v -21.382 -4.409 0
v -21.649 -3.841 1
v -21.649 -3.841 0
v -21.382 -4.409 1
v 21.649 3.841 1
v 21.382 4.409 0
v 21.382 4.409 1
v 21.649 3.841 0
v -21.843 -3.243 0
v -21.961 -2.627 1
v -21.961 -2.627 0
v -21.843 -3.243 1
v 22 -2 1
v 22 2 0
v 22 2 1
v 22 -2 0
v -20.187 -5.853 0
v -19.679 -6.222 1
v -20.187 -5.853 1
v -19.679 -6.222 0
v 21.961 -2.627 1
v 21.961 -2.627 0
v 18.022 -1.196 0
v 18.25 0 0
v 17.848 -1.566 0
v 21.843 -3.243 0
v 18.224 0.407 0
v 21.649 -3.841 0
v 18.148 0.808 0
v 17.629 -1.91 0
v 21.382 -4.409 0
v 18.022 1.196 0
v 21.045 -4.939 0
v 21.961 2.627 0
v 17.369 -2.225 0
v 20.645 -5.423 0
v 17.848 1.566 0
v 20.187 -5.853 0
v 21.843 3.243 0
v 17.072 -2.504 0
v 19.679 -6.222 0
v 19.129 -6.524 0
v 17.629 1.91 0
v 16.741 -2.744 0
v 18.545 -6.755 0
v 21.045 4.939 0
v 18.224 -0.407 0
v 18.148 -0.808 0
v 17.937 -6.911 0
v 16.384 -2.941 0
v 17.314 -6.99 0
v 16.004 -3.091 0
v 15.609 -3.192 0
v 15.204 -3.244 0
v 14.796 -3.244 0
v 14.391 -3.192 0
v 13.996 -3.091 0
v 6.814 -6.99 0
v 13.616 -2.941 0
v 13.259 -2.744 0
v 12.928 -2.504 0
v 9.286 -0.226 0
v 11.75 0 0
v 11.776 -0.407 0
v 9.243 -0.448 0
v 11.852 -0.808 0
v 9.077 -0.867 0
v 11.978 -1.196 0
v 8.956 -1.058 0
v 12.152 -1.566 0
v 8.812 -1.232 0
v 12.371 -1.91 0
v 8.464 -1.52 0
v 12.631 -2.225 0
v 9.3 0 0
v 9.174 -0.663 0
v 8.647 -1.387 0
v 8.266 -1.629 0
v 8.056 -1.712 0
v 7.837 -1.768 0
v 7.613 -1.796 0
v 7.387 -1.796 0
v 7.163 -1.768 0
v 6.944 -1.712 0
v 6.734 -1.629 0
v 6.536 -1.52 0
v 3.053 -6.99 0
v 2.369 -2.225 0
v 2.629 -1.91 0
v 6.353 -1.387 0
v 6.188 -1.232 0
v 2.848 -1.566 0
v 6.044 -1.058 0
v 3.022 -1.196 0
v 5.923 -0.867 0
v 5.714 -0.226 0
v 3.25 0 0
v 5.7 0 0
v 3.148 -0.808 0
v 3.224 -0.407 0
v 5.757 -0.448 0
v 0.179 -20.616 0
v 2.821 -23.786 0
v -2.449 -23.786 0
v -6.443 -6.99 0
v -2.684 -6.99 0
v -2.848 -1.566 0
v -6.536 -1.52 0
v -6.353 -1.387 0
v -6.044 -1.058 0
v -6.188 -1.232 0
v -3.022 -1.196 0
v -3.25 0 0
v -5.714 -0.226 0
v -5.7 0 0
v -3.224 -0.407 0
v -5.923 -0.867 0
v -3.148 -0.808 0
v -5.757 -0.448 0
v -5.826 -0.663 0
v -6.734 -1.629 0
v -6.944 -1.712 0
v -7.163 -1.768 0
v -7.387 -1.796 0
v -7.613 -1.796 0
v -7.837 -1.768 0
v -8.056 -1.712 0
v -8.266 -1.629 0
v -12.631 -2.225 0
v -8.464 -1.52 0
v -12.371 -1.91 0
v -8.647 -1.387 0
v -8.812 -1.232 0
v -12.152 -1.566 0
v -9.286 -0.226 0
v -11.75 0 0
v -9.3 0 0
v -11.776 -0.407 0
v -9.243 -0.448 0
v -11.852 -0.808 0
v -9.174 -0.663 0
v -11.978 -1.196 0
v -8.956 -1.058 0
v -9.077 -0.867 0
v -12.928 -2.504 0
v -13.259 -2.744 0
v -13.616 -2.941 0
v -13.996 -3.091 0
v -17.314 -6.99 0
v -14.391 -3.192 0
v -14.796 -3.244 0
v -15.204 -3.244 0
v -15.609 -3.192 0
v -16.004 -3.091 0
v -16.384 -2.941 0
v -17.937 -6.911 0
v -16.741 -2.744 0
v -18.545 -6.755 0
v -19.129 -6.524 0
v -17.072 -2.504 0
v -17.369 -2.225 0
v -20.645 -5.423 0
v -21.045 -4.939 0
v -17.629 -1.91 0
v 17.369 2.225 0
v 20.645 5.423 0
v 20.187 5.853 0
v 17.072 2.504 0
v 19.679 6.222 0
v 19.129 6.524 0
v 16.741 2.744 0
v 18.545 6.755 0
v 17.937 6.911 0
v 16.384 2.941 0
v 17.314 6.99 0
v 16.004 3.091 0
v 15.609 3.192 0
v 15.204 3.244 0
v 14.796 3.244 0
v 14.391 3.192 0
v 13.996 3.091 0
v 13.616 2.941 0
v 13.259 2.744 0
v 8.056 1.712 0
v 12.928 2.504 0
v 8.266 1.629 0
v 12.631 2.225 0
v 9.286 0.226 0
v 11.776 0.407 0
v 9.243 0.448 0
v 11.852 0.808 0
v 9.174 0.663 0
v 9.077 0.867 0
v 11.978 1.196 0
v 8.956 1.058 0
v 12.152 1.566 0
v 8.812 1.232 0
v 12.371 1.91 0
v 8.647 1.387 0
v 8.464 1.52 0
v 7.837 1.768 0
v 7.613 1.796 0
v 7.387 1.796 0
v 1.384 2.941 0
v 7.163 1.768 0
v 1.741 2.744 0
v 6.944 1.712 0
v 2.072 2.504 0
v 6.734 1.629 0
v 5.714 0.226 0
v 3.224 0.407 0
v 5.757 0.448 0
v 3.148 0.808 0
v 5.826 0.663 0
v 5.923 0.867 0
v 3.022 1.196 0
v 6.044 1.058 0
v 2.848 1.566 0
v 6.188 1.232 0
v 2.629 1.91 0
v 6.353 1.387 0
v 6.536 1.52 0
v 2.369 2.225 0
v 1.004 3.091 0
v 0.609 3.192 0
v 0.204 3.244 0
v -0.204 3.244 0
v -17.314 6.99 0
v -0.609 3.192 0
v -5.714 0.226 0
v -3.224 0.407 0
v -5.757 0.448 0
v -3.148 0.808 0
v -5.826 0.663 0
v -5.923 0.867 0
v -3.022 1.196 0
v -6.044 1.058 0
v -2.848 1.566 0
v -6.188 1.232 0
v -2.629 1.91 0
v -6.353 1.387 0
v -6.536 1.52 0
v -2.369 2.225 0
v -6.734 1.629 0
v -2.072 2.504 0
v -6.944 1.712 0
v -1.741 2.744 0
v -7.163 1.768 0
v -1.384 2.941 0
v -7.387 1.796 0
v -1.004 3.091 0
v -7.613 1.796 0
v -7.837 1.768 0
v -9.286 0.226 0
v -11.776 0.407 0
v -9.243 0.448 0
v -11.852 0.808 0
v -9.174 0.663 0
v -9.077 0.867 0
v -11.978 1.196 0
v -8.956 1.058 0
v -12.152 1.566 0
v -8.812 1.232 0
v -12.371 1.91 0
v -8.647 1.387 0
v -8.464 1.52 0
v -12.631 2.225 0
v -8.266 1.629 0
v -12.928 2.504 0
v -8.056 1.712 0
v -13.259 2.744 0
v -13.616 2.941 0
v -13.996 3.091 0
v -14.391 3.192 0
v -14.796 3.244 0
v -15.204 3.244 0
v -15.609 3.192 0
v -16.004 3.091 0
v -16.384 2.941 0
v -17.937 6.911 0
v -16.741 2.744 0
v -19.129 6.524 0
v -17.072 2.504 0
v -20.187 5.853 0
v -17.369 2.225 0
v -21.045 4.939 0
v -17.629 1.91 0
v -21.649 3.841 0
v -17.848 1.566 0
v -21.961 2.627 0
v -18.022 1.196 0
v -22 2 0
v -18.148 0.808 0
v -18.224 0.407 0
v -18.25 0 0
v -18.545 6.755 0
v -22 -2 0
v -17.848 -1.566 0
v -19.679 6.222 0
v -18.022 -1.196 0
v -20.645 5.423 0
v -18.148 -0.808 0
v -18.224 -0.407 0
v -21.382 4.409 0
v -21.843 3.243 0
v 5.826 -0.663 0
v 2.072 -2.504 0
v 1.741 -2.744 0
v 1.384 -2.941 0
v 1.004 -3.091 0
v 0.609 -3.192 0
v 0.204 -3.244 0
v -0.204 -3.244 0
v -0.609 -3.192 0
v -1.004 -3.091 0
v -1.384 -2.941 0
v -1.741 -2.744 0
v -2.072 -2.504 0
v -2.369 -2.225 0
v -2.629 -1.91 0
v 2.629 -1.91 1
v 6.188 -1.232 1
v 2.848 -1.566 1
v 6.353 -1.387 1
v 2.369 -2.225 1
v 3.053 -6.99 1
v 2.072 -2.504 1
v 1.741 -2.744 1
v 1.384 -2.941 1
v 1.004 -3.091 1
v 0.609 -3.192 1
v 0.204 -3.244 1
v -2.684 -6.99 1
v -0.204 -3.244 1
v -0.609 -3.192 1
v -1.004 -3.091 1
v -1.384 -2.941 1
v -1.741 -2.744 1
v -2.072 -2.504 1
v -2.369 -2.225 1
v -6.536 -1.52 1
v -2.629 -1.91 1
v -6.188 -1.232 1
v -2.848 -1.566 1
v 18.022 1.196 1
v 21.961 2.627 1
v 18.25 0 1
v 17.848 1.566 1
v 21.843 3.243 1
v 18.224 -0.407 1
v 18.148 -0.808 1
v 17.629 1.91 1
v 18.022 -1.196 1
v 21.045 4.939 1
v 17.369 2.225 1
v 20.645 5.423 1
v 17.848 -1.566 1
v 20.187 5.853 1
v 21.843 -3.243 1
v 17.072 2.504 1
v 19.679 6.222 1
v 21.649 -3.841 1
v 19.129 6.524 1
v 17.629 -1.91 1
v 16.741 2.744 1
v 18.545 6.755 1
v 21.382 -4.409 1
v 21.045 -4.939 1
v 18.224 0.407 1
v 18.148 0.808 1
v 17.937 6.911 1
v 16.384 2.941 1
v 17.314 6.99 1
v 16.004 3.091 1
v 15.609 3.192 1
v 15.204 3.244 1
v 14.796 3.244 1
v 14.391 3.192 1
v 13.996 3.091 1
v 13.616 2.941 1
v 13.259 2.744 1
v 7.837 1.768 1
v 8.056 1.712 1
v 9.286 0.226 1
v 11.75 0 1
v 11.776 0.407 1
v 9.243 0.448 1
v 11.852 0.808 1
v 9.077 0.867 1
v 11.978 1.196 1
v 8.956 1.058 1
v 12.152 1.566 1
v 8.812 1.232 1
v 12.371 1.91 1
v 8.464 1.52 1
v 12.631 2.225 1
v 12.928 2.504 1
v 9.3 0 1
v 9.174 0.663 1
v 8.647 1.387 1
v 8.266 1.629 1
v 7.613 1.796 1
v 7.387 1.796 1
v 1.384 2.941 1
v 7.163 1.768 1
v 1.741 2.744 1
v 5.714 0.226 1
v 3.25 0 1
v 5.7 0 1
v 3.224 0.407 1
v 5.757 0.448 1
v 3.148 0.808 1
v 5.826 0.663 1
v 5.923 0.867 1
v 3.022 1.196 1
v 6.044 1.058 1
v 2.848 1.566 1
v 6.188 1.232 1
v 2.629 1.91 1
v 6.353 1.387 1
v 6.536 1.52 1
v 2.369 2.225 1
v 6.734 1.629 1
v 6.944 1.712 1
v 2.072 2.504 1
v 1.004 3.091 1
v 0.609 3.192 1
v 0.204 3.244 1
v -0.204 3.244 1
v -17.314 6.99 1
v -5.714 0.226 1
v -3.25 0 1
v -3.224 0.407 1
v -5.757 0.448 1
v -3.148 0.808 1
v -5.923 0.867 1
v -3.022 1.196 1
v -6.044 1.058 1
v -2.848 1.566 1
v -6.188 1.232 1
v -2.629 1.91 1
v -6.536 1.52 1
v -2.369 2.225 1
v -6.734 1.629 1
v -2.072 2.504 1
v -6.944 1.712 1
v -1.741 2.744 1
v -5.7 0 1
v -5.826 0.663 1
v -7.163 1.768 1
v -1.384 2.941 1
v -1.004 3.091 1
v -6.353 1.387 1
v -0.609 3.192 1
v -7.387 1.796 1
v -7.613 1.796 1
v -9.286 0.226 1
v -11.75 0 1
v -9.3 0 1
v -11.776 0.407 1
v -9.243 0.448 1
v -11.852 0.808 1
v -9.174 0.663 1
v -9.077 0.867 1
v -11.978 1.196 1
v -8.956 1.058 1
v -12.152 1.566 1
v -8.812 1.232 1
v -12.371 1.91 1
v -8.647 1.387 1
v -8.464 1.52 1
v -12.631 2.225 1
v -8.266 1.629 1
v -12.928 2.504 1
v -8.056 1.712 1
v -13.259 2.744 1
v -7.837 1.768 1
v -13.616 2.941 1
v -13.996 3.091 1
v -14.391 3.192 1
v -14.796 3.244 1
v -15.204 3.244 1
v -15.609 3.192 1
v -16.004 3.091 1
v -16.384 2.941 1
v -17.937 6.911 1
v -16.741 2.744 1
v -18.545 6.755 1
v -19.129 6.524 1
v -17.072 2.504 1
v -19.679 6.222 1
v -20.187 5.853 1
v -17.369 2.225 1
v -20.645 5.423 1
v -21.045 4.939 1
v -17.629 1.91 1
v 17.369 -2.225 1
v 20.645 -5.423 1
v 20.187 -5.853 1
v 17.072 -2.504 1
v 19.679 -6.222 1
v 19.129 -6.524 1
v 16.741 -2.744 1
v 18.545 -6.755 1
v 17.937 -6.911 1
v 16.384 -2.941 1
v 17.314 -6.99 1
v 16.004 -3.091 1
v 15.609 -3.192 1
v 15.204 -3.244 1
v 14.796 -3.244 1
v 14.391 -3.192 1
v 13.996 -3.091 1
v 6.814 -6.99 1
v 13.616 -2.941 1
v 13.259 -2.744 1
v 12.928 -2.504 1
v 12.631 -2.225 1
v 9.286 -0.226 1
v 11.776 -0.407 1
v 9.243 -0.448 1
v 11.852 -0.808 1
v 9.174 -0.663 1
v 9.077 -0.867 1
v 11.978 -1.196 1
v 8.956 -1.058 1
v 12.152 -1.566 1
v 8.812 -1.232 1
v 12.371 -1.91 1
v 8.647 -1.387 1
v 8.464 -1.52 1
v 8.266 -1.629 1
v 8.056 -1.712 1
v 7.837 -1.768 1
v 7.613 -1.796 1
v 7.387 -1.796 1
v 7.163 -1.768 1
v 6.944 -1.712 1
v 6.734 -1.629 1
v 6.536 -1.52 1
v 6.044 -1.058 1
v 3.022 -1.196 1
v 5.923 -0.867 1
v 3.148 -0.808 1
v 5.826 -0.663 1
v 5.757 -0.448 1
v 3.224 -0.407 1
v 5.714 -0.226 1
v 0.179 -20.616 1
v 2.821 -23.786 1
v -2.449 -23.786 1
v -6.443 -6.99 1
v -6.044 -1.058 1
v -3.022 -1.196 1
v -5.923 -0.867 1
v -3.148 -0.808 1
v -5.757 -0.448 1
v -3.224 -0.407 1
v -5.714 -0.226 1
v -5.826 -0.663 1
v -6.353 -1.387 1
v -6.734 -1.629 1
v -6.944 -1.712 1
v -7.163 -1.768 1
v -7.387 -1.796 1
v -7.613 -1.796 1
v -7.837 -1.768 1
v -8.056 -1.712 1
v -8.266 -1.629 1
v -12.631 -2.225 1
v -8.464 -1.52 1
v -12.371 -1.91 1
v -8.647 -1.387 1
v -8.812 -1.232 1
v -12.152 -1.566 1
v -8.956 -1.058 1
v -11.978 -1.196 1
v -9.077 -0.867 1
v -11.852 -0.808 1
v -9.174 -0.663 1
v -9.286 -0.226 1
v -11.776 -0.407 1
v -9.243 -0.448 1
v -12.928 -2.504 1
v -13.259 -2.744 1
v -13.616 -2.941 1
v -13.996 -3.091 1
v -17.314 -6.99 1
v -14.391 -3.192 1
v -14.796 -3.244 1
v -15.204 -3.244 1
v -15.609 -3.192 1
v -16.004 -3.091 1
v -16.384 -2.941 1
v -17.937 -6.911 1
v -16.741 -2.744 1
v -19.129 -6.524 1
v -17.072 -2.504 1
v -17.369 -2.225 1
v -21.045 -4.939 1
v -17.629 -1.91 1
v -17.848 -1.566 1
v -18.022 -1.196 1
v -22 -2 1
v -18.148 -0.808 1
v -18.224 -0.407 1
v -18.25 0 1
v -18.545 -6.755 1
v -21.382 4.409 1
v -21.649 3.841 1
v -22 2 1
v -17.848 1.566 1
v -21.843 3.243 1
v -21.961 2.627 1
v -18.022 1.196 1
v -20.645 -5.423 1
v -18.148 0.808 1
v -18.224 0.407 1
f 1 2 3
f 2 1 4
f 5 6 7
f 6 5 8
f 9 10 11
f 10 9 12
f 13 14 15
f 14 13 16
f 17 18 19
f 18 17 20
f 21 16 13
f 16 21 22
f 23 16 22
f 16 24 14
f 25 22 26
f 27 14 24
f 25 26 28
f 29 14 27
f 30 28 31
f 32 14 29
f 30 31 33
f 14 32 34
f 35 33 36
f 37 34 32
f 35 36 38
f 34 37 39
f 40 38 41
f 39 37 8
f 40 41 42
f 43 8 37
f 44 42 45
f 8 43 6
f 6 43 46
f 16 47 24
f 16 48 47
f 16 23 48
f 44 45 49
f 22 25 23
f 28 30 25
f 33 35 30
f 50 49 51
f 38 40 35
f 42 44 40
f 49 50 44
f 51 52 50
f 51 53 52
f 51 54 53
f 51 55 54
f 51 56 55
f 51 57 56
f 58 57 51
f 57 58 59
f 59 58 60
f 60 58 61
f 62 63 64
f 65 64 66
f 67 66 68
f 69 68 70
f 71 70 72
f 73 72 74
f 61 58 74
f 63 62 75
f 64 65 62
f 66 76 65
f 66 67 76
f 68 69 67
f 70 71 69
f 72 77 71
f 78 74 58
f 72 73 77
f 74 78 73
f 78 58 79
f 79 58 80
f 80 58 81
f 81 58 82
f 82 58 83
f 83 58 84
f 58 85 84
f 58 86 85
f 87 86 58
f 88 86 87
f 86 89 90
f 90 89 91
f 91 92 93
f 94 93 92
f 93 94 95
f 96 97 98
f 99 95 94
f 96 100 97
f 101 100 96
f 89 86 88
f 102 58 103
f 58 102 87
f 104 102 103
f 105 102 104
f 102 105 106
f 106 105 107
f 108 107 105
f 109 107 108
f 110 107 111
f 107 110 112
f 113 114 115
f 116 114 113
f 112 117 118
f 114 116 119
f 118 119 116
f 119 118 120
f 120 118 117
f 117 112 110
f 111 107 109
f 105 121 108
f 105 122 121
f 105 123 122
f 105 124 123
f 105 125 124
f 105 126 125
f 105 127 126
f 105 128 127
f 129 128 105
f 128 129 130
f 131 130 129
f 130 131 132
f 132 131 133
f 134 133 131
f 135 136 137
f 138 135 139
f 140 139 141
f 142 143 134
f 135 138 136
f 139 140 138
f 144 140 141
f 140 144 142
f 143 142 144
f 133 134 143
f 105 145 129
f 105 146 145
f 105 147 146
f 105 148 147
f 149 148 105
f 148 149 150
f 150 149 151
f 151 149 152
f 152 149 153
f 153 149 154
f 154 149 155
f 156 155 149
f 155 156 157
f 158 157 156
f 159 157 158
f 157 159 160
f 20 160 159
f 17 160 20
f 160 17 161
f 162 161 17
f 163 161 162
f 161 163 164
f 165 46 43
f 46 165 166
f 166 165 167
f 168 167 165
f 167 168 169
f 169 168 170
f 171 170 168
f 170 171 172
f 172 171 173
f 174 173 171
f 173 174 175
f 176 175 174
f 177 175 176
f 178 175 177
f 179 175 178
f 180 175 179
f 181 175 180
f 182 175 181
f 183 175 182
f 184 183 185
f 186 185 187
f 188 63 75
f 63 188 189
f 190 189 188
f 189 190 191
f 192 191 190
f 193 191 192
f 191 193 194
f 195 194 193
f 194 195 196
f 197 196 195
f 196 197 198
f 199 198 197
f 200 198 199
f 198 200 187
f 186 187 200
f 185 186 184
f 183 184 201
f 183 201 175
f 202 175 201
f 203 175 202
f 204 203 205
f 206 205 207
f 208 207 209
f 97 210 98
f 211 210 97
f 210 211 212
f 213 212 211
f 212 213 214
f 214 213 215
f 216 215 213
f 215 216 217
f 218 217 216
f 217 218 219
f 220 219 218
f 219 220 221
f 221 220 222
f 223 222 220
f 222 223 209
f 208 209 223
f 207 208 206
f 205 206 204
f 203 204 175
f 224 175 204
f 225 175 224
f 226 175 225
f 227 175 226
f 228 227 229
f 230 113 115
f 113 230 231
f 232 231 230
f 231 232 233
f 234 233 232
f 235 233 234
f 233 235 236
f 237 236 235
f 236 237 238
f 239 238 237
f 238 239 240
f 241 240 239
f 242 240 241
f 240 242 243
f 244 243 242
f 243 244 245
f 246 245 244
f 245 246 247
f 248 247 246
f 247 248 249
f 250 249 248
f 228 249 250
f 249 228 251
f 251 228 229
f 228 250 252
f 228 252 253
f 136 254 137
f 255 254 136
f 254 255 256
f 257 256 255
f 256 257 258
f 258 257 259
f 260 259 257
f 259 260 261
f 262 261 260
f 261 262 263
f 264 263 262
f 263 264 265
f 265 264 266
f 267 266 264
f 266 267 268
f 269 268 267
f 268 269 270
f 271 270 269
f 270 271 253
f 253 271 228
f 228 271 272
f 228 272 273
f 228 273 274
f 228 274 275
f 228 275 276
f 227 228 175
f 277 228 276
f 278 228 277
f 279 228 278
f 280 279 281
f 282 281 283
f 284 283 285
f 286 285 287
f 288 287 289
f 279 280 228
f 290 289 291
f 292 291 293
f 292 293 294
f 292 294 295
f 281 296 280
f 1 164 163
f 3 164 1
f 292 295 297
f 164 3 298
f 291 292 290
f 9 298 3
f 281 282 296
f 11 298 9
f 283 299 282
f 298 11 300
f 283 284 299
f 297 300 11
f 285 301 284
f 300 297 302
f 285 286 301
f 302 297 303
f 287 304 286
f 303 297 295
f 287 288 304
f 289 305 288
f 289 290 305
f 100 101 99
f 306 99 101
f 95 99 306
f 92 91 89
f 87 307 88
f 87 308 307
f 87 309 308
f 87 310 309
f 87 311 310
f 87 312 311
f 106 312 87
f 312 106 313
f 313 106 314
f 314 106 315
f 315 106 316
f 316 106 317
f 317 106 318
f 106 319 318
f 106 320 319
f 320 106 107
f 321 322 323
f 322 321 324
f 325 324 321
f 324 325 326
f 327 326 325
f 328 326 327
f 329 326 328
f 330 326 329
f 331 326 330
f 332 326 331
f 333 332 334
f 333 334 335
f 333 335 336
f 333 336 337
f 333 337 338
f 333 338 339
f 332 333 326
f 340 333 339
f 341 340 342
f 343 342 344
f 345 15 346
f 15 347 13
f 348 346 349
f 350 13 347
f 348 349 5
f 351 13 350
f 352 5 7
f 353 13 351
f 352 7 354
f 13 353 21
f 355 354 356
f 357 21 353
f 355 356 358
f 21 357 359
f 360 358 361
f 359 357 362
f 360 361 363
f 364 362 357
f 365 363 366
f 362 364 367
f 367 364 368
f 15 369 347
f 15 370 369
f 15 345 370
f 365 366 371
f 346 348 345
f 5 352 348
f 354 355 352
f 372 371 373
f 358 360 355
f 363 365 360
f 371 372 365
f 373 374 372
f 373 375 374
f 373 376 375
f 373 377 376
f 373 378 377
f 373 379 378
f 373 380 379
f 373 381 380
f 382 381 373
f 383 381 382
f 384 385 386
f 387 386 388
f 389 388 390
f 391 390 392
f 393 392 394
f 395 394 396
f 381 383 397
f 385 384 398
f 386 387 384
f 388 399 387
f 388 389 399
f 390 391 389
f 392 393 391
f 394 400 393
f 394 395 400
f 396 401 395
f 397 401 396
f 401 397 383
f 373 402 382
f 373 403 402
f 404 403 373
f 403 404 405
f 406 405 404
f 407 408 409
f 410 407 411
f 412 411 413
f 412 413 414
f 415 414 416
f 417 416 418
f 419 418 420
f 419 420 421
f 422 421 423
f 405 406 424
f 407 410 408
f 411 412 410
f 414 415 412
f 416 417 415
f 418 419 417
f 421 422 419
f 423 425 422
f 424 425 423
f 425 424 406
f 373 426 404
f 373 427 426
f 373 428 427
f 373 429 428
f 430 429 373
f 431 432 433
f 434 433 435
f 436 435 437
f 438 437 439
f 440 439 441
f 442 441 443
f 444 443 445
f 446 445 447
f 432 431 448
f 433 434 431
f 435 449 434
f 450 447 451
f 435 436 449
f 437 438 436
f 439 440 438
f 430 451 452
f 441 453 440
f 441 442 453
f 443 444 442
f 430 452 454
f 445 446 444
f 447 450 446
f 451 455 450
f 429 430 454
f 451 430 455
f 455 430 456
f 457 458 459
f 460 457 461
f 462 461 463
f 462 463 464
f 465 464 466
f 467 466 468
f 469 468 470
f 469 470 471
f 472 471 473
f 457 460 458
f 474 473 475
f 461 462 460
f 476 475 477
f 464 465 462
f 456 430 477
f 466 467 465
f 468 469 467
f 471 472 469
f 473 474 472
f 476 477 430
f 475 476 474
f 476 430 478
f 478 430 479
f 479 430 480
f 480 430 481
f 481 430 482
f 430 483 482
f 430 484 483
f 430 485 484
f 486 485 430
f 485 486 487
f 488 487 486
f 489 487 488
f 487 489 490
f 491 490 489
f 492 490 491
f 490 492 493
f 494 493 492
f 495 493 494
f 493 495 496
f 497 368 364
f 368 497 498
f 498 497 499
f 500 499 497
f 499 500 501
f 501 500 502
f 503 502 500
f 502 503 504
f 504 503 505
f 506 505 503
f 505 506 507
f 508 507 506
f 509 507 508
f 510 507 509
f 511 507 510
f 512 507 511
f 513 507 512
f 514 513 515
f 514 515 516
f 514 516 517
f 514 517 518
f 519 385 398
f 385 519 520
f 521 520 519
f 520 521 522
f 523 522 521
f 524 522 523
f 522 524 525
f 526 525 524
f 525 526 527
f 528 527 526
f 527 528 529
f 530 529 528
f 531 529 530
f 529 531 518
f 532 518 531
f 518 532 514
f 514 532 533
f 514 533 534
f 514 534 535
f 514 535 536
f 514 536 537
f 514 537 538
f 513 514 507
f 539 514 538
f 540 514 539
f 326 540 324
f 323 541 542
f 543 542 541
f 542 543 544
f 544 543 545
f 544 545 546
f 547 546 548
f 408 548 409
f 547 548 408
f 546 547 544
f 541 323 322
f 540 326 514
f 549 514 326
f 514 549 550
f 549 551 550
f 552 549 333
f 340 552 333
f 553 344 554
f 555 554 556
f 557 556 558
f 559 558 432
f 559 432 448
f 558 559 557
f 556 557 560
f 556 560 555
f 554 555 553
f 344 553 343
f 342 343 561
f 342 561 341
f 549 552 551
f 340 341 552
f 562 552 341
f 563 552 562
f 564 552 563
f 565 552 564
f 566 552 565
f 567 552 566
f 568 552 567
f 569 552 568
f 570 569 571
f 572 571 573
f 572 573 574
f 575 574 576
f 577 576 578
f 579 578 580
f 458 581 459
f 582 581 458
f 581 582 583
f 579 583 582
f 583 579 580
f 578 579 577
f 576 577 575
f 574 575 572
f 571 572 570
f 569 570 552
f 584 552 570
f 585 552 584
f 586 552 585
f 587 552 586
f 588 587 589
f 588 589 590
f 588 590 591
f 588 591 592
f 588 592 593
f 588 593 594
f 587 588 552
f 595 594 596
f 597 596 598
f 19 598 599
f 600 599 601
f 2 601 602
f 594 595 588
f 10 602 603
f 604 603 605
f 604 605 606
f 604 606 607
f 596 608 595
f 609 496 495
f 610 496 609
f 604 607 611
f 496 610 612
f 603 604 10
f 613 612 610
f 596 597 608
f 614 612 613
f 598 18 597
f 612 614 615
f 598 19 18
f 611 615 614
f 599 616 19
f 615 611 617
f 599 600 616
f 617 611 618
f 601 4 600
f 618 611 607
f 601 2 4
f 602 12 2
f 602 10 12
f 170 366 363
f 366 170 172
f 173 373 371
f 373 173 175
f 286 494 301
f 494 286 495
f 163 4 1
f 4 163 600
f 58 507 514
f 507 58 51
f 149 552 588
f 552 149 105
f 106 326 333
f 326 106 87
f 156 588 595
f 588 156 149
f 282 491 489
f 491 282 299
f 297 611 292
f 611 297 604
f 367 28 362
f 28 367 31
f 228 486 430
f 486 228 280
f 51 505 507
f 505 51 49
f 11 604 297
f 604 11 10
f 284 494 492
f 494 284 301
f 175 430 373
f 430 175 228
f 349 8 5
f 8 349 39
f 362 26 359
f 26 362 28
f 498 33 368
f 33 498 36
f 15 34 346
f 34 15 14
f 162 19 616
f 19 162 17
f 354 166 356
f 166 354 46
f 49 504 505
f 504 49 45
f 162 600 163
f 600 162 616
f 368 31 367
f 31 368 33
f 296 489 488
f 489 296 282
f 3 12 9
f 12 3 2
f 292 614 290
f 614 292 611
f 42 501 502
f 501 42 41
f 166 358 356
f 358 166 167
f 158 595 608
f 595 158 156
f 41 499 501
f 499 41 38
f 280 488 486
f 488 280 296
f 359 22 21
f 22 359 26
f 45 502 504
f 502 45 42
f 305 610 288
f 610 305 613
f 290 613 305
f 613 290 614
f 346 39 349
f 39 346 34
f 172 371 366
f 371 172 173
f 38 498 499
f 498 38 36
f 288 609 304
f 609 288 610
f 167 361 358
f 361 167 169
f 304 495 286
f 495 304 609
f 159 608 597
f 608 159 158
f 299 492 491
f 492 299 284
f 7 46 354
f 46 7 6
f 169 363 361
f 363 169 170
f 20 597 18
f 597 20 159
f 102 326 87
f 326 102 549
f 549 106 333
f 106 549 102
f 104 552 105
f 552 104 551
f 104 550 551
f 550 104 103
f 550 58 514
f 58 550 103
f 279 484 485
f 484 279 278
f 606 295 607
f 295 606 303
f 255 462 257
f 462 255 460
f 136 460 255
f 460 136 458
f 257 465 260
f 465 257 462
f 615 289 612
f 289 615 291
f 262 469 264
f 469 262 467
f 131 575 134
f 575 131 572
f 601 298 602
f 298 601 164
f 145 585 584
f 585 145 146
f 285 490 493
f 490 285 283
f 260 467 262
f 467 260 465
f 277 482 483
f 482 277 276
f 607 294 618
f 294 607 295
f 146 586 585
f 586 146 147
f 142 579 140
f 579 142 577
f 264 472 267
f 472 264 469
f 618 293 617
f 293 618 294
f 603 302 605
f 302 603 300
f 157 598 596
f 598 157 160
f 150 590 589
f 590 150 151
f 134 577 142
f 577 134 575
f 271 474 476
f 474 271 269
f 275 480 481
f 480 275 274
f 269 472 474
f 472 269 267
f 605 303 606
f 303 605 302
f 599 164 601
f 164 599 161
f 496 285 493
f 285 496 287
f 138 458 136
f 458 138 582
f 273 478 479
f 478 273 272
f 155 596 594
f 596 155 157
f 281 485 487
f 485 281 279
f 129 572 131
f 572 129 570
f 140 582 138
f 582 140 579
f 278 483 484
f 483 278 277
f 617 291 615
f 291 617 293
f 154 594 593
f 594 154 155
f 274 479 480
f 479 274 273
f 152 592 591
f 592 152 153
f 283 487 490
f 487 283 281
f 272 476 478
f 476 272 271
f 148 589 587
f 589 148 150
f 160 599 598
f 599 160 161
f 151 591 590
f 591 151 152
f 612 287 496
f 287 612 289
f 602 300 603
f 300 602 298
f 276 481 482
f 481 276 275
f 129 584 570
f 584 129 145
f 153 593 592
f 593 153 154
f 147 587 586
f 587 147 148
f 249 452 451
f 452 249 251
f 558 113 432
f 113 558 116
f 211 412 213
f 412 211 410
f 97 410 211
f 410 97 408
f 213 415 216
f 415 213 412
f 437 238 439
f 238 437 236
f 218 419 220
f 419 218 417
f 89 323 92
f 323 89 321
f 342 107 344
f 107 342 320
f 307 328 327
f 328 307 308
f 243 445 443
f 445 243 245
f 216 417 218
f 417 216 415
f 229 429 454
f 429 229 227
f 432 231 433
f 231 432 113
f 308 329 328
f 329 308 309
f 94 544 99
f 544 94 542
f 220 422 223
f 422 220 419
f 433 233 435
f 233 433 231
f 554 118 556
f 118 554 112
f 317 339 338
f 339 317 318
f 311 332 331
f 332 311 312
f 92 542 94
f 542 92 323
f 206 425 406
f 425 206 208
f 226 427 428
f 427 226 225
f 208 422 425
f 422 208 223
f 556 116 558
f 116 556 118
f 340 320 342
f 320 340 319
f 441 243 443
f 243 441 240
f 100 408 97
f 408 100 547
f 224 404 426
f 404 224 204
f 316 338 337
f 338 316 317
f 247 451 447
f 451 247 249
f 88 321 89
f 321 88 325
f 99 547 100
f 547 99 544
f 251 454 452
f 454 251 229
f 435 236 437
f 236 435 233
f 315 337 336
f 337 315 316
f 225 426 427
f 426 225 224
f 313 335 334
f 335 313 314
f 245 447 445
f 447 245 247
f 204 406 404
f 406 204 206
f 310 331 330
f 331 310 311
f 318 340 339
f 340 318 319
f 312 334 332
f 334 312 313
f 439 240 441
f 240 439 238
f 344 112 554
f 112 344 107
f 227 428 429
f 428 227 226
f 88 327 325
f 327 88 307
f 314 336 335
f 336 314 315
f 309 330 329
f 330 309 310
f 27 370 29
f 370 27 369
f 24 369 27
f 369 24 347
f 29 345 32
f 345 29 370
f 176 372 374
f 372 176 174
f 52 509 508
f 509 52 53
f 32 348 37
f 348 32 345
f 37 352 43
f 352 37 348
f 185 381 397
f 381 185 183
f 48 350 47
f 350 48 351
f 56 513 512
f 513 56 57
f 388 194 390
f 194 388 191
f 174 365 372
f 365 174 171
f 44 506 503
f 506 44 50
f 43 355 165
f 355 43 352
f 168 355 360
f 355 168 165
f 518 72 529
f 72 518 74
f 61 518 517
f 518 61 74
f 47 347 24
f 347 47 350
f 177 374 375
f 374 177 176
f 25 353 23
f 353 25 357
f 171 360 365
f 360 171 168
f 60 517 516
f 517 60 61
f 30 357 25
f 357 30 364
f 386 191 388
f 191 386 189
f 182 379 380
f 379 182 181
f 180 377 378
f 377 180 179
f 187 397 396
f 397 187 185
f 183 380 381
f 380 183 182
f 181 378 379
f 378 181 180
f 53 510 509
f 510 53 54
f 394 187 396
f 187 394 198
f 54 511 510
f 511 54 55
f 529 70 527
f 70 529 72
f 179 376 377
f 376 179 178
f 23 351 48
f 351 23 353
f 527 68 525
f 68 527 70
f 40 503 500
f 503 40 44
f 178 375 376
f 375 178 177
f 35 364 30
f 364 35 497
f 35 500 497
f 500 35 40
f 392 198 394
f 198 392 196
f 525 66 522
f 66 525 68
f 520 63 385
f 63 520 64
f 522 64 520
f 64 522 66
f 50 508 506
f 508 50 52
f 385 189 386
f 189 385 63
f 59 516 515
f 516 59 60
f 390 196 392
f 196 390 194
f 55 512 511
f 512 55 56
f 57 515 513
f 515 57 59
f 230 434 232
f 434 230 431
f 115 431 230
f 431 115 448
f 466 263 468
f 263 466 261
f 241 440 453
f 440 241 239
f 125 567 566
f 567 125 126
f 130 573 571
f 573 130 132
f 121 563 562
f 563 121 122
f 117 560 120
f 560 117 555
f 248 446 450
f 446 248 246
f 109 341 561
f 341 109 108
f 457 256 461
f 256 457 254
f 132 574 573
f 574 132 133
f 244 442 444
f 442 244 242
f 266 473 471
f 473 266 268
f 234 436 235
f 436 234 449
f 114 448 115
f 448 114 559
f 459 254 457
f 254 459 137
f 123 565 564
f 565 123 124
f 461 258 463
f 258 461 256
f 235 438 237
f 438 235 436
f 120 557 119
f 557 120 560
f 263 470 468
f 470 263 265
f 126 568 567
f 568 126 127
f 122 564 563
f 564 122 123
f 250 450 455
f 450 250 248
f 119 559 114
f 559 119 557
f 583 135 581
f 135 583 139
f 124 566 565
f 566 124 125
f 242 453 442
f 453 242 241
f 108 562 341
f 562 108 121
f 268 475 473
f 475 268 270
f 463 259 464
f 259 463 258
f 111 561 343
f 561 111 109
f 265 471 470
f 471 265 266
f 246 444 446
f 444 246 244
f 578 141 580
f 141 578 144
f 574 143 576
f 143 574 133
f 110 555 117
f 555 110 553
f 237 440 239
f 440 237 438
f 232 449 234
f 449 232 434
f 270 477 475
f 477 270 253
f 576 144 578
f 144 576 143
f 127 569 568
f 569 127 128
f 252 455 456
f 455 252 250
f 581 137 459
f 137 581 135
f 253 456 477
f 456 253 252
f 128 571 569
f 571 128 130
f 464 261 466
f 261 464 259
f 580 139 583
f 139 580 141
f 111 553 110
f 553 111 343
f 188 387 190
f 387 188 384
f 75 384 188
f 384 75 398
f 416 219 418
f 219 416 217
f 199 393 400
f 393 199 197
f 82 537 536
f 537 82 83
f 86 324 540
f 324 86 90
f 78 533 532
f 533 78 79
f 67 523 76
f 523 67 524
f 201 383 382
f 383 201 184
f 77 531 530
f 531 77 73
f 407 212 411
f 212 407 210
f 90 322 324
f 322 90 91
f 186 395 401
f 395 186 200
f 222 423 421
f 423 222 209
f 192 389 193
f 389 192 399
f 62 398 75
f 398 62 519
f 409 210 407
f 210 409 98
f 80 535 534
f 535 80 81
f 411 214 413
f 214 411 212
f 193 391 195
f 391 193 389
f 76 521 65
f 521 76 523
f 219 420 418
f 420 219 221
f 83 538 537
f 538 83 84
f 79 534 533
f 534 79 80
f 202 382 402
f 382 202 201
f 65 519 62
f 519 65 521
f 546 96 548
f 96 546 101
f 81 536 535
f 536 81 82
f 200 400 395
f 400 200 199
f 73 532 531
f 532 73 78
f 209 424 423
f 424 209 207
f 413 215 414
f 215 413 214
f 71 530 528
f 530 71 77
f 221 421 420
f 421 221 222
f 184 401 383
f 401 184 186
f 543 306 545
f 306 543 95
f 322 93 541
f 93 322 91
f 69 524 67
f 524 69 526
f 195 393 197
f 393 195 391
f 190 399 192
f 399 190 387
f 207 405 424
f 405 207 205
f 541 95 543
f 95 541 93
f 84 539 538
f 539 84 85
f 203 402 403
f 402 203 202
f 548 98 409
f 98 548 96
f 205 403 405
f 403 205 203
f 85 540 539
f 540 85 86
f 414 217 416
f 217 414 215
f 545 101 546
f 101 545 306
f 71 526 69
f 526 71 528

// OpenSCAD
$fn = 50;


difference() {
	union() {
		hull() {
			translate(v = [-17.0000000000, 2.0000000000, 0]) {
				cylinder(h = 1, r = 5);
			}
			translate(v = [17.0000000000, 2.0000000000, 0]) {
				cylinder(h = 1, r = 5);
			}
			translate(v = [-17.0000000000, -2.0000000000, 0]) {
				cylinder(h = 1, r = 5);
			}
			translate(v = [17.0000000000, -2.0000000000, 0]) {
				cylinder(h = 1, r = 5);
			}
		}
		translate(v = [0, -5, 0]) {
			linear_extrude(height = 1) {
				text(font = "DejaVu Sans Mono:style=Bold", halign = "center", size = 19.0000000000, text = "V", valign = "top");
			}
		}
	}
	union() {
		translate(v = [-15.0000000000, 0.0000000000, 0]) {
			translate(v = [0, 0, -100]) {
				cylinder(h = 200, r = 3.2500000000);
			}
		}
		translate(v = [0, 0, -100]) {
			cylinder(h = 200, r = 3.2500000000);
		}
		translate(v = [15.0000000000, 0.0000000000, 0]) {
			translate(v = [0, 0, -100]) {
				cylinder(h = 200, r = 3.2500000000);
			}
		}
		translate(v = [-15.0000000000, 0.0000000000, 0]) {
			translate(v = [0, 0, -100]) {
				cylinder(h = 200, r = 1.8000000000);
			}
		}
		translate(v = [-7.5000000000, 0.0000000000, 0]) {
			translate(v = [0, 0, -100]) {
				cylinder(h = 200, r = 1.8000000000);
			}
		}
		translate(v = [0, 0, -100]) {
			cylinder(h = 200, r = 1.8000000000);
		}
		translate(v = [7.5000000000, 0.0000000000, 0]) {
			translate(v = [0, 0, -100]) {
				cylinder(h = 200, r = 1.8000000000);
			}
		}
		translate(v = [15.0000000000, 0.0000000000, 0]) {
			translate(v = [0, 0, -100]) {
				cylinder(h = 200, r = 1.8000000000);
			}
		}
	}
}
